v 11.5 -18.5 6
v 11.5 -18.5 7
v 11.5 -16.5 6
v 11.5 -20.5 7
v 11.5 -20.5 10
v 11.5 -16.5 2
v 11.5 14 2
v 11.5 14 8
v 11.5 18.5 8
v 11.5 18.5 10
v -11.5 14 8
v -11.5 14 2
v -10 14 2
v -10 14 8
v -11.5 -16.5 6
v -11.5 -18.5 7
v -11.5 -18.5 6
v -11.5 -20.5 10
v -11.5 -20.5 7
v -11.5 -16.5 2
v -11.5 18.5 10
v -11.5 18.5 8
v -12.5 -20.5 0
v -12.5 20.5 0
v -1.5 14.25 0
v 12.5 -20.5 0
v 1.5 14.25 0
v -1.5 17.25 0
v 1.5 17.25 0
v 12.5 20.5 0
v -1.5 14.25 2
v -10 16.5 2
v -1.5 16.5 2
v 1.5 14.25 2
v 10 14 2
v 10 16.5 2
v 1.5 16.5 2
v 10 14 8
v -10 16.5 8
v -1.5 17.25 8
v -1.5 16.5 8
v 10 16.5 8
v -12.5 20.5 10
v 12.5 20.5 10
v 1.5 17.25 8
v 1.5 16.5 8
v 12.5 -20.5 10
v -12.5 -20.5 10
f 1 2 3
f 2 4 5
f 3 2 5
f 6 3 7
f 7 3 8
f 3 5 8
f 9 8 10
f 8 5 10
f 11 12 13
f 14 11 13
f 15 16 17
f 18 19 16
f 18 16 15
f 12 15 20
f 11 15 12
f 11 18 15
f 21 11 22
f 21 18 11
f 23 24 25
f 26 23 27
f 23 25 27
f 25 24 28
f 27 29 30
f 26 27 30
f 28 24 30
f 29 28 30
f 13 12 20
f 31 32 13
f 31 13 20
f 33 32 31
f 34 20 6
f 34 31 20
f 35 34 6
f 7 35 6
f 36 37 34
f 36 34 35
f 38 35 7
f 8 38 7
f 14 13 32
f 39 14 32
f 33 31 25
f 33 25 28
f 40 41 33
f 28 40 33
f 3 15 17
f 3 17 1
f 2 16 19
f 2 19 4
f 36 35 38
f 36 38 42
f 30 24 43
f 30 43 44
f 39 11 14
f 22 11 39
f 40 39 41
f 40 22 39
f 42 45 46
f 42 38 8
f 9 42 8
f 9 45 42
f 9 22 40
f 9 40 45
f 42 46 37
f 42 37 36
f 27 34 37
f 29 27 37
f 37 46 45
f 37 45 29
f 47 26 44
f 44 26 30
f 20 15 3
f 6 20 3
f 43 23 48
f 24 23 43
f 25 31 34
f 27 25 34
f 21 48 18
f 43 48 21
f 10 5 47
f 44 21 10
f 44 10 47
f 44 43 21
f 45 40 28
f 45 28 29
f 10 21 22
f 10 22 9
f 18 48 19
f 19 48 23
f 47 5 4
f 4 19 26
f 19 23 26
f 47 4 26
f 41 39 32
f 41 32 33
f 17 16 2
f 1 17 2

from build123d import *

# Parameters (mm, degrees)
SKETCH_W        = 25
SKETCH_H        = 41
PAD_DEPTH       = 10
SKETCH001_W     = 23
SKETCH001_H     = 37
POCKET_DEPTH    = 2
SKETCH002_W     = 23
SKETCH002_H     = 33
POCKET001_DEPTH = 6
SKETCH003_W     = 23
SKETCH003_H     = 2
POCKET002_DEPTH = 4
SKETCH005_W     = 23
SKETCH005_H     = 6
POCKET003_DEPTH = 3
SKETCH006_W     = 3
SKETCH006_H     = 3
POCKET004_DEPTH = 8.001
SKETCH012_W     = 1.5
SKETCH012_H     = 2.5
PAD004_DEPTH    = 6


with BuildPart() as part:
    # Sketch → Pad (new body)
    with BuildSketch(Plane.XY):
        Rectangle(SKETCH_W, SKETCH_H)
    extrude(amount=PAD_DEPTH)

    # Sketch001 (on Face6 of Pad) → Pocket (cut)
    with BuildSketch(Plane.XY.offset(10)):
        Rectangle(SKETCH001_W, SKETCH001_H)
    extrude(amount=-POCKET_DEPTH, mode=Mode.SUBTRACT)

    # Sketch002 (on Face11 of Pocket) → Pocket001 (cut)
    with BuildSketch(Plane.XY.offset(8)):
        Rectangle(SKETCH002_W, SKETCH002_H)
    extrude(amount=-POCKET001_DEPTH, mode=Mode.SUBTRACT)

    # Sketch003 (on Face5 of Pocket001) → Pocket002 (cut)
    with BuildSketch(Plane.XY.offset(10)):
        with Locations((0, -17.5)):
            Rectangle(SKETCH003_W, SKETCH003_H)
    extrude(amount=-POCKET002_DEPTH, mode=Mode.SUBTRACT)

    # Sketch005 (on Face5 of Pocket002) → Pocket003 (cut)
    with BuildSketch(Plane.XY.offset(10)):
        with Locations((0, -19.5)):
            Rectangle(SKETCH005_W, SKETCH005_H)
    extrude(amount=-POCKET003_DEPTH, mode=Mode.SUBTRACT)

    # Sketch006 (on Face16 of Pocket003) → Pocket004 (cut, through all)
    with BuildSketch(Plane.XY.offset(8)):
        with Locations((0, 15.75)):
            Rectangle(SKETCH006_W, SKETCH006_H)
    extrude(amount=-POCKET004_DEPTH, mode=Mode.SUBTRACT)

    # Sketch012 (on Face21 of Pocket004) → Pad004 (join)
    with BuildSketch(Plane.XY.offset(2)):
        with Locations((-10.75, 15.25)):
            Rectangle(SKETCH012_W, SKETCH012_H)
        with Locations((10.75, 15.25)):
            Rectangle(SKETCH012_W, SKETCH012_H)
    extrude(amount=PAD004_DEPTH)


solid = part.part
